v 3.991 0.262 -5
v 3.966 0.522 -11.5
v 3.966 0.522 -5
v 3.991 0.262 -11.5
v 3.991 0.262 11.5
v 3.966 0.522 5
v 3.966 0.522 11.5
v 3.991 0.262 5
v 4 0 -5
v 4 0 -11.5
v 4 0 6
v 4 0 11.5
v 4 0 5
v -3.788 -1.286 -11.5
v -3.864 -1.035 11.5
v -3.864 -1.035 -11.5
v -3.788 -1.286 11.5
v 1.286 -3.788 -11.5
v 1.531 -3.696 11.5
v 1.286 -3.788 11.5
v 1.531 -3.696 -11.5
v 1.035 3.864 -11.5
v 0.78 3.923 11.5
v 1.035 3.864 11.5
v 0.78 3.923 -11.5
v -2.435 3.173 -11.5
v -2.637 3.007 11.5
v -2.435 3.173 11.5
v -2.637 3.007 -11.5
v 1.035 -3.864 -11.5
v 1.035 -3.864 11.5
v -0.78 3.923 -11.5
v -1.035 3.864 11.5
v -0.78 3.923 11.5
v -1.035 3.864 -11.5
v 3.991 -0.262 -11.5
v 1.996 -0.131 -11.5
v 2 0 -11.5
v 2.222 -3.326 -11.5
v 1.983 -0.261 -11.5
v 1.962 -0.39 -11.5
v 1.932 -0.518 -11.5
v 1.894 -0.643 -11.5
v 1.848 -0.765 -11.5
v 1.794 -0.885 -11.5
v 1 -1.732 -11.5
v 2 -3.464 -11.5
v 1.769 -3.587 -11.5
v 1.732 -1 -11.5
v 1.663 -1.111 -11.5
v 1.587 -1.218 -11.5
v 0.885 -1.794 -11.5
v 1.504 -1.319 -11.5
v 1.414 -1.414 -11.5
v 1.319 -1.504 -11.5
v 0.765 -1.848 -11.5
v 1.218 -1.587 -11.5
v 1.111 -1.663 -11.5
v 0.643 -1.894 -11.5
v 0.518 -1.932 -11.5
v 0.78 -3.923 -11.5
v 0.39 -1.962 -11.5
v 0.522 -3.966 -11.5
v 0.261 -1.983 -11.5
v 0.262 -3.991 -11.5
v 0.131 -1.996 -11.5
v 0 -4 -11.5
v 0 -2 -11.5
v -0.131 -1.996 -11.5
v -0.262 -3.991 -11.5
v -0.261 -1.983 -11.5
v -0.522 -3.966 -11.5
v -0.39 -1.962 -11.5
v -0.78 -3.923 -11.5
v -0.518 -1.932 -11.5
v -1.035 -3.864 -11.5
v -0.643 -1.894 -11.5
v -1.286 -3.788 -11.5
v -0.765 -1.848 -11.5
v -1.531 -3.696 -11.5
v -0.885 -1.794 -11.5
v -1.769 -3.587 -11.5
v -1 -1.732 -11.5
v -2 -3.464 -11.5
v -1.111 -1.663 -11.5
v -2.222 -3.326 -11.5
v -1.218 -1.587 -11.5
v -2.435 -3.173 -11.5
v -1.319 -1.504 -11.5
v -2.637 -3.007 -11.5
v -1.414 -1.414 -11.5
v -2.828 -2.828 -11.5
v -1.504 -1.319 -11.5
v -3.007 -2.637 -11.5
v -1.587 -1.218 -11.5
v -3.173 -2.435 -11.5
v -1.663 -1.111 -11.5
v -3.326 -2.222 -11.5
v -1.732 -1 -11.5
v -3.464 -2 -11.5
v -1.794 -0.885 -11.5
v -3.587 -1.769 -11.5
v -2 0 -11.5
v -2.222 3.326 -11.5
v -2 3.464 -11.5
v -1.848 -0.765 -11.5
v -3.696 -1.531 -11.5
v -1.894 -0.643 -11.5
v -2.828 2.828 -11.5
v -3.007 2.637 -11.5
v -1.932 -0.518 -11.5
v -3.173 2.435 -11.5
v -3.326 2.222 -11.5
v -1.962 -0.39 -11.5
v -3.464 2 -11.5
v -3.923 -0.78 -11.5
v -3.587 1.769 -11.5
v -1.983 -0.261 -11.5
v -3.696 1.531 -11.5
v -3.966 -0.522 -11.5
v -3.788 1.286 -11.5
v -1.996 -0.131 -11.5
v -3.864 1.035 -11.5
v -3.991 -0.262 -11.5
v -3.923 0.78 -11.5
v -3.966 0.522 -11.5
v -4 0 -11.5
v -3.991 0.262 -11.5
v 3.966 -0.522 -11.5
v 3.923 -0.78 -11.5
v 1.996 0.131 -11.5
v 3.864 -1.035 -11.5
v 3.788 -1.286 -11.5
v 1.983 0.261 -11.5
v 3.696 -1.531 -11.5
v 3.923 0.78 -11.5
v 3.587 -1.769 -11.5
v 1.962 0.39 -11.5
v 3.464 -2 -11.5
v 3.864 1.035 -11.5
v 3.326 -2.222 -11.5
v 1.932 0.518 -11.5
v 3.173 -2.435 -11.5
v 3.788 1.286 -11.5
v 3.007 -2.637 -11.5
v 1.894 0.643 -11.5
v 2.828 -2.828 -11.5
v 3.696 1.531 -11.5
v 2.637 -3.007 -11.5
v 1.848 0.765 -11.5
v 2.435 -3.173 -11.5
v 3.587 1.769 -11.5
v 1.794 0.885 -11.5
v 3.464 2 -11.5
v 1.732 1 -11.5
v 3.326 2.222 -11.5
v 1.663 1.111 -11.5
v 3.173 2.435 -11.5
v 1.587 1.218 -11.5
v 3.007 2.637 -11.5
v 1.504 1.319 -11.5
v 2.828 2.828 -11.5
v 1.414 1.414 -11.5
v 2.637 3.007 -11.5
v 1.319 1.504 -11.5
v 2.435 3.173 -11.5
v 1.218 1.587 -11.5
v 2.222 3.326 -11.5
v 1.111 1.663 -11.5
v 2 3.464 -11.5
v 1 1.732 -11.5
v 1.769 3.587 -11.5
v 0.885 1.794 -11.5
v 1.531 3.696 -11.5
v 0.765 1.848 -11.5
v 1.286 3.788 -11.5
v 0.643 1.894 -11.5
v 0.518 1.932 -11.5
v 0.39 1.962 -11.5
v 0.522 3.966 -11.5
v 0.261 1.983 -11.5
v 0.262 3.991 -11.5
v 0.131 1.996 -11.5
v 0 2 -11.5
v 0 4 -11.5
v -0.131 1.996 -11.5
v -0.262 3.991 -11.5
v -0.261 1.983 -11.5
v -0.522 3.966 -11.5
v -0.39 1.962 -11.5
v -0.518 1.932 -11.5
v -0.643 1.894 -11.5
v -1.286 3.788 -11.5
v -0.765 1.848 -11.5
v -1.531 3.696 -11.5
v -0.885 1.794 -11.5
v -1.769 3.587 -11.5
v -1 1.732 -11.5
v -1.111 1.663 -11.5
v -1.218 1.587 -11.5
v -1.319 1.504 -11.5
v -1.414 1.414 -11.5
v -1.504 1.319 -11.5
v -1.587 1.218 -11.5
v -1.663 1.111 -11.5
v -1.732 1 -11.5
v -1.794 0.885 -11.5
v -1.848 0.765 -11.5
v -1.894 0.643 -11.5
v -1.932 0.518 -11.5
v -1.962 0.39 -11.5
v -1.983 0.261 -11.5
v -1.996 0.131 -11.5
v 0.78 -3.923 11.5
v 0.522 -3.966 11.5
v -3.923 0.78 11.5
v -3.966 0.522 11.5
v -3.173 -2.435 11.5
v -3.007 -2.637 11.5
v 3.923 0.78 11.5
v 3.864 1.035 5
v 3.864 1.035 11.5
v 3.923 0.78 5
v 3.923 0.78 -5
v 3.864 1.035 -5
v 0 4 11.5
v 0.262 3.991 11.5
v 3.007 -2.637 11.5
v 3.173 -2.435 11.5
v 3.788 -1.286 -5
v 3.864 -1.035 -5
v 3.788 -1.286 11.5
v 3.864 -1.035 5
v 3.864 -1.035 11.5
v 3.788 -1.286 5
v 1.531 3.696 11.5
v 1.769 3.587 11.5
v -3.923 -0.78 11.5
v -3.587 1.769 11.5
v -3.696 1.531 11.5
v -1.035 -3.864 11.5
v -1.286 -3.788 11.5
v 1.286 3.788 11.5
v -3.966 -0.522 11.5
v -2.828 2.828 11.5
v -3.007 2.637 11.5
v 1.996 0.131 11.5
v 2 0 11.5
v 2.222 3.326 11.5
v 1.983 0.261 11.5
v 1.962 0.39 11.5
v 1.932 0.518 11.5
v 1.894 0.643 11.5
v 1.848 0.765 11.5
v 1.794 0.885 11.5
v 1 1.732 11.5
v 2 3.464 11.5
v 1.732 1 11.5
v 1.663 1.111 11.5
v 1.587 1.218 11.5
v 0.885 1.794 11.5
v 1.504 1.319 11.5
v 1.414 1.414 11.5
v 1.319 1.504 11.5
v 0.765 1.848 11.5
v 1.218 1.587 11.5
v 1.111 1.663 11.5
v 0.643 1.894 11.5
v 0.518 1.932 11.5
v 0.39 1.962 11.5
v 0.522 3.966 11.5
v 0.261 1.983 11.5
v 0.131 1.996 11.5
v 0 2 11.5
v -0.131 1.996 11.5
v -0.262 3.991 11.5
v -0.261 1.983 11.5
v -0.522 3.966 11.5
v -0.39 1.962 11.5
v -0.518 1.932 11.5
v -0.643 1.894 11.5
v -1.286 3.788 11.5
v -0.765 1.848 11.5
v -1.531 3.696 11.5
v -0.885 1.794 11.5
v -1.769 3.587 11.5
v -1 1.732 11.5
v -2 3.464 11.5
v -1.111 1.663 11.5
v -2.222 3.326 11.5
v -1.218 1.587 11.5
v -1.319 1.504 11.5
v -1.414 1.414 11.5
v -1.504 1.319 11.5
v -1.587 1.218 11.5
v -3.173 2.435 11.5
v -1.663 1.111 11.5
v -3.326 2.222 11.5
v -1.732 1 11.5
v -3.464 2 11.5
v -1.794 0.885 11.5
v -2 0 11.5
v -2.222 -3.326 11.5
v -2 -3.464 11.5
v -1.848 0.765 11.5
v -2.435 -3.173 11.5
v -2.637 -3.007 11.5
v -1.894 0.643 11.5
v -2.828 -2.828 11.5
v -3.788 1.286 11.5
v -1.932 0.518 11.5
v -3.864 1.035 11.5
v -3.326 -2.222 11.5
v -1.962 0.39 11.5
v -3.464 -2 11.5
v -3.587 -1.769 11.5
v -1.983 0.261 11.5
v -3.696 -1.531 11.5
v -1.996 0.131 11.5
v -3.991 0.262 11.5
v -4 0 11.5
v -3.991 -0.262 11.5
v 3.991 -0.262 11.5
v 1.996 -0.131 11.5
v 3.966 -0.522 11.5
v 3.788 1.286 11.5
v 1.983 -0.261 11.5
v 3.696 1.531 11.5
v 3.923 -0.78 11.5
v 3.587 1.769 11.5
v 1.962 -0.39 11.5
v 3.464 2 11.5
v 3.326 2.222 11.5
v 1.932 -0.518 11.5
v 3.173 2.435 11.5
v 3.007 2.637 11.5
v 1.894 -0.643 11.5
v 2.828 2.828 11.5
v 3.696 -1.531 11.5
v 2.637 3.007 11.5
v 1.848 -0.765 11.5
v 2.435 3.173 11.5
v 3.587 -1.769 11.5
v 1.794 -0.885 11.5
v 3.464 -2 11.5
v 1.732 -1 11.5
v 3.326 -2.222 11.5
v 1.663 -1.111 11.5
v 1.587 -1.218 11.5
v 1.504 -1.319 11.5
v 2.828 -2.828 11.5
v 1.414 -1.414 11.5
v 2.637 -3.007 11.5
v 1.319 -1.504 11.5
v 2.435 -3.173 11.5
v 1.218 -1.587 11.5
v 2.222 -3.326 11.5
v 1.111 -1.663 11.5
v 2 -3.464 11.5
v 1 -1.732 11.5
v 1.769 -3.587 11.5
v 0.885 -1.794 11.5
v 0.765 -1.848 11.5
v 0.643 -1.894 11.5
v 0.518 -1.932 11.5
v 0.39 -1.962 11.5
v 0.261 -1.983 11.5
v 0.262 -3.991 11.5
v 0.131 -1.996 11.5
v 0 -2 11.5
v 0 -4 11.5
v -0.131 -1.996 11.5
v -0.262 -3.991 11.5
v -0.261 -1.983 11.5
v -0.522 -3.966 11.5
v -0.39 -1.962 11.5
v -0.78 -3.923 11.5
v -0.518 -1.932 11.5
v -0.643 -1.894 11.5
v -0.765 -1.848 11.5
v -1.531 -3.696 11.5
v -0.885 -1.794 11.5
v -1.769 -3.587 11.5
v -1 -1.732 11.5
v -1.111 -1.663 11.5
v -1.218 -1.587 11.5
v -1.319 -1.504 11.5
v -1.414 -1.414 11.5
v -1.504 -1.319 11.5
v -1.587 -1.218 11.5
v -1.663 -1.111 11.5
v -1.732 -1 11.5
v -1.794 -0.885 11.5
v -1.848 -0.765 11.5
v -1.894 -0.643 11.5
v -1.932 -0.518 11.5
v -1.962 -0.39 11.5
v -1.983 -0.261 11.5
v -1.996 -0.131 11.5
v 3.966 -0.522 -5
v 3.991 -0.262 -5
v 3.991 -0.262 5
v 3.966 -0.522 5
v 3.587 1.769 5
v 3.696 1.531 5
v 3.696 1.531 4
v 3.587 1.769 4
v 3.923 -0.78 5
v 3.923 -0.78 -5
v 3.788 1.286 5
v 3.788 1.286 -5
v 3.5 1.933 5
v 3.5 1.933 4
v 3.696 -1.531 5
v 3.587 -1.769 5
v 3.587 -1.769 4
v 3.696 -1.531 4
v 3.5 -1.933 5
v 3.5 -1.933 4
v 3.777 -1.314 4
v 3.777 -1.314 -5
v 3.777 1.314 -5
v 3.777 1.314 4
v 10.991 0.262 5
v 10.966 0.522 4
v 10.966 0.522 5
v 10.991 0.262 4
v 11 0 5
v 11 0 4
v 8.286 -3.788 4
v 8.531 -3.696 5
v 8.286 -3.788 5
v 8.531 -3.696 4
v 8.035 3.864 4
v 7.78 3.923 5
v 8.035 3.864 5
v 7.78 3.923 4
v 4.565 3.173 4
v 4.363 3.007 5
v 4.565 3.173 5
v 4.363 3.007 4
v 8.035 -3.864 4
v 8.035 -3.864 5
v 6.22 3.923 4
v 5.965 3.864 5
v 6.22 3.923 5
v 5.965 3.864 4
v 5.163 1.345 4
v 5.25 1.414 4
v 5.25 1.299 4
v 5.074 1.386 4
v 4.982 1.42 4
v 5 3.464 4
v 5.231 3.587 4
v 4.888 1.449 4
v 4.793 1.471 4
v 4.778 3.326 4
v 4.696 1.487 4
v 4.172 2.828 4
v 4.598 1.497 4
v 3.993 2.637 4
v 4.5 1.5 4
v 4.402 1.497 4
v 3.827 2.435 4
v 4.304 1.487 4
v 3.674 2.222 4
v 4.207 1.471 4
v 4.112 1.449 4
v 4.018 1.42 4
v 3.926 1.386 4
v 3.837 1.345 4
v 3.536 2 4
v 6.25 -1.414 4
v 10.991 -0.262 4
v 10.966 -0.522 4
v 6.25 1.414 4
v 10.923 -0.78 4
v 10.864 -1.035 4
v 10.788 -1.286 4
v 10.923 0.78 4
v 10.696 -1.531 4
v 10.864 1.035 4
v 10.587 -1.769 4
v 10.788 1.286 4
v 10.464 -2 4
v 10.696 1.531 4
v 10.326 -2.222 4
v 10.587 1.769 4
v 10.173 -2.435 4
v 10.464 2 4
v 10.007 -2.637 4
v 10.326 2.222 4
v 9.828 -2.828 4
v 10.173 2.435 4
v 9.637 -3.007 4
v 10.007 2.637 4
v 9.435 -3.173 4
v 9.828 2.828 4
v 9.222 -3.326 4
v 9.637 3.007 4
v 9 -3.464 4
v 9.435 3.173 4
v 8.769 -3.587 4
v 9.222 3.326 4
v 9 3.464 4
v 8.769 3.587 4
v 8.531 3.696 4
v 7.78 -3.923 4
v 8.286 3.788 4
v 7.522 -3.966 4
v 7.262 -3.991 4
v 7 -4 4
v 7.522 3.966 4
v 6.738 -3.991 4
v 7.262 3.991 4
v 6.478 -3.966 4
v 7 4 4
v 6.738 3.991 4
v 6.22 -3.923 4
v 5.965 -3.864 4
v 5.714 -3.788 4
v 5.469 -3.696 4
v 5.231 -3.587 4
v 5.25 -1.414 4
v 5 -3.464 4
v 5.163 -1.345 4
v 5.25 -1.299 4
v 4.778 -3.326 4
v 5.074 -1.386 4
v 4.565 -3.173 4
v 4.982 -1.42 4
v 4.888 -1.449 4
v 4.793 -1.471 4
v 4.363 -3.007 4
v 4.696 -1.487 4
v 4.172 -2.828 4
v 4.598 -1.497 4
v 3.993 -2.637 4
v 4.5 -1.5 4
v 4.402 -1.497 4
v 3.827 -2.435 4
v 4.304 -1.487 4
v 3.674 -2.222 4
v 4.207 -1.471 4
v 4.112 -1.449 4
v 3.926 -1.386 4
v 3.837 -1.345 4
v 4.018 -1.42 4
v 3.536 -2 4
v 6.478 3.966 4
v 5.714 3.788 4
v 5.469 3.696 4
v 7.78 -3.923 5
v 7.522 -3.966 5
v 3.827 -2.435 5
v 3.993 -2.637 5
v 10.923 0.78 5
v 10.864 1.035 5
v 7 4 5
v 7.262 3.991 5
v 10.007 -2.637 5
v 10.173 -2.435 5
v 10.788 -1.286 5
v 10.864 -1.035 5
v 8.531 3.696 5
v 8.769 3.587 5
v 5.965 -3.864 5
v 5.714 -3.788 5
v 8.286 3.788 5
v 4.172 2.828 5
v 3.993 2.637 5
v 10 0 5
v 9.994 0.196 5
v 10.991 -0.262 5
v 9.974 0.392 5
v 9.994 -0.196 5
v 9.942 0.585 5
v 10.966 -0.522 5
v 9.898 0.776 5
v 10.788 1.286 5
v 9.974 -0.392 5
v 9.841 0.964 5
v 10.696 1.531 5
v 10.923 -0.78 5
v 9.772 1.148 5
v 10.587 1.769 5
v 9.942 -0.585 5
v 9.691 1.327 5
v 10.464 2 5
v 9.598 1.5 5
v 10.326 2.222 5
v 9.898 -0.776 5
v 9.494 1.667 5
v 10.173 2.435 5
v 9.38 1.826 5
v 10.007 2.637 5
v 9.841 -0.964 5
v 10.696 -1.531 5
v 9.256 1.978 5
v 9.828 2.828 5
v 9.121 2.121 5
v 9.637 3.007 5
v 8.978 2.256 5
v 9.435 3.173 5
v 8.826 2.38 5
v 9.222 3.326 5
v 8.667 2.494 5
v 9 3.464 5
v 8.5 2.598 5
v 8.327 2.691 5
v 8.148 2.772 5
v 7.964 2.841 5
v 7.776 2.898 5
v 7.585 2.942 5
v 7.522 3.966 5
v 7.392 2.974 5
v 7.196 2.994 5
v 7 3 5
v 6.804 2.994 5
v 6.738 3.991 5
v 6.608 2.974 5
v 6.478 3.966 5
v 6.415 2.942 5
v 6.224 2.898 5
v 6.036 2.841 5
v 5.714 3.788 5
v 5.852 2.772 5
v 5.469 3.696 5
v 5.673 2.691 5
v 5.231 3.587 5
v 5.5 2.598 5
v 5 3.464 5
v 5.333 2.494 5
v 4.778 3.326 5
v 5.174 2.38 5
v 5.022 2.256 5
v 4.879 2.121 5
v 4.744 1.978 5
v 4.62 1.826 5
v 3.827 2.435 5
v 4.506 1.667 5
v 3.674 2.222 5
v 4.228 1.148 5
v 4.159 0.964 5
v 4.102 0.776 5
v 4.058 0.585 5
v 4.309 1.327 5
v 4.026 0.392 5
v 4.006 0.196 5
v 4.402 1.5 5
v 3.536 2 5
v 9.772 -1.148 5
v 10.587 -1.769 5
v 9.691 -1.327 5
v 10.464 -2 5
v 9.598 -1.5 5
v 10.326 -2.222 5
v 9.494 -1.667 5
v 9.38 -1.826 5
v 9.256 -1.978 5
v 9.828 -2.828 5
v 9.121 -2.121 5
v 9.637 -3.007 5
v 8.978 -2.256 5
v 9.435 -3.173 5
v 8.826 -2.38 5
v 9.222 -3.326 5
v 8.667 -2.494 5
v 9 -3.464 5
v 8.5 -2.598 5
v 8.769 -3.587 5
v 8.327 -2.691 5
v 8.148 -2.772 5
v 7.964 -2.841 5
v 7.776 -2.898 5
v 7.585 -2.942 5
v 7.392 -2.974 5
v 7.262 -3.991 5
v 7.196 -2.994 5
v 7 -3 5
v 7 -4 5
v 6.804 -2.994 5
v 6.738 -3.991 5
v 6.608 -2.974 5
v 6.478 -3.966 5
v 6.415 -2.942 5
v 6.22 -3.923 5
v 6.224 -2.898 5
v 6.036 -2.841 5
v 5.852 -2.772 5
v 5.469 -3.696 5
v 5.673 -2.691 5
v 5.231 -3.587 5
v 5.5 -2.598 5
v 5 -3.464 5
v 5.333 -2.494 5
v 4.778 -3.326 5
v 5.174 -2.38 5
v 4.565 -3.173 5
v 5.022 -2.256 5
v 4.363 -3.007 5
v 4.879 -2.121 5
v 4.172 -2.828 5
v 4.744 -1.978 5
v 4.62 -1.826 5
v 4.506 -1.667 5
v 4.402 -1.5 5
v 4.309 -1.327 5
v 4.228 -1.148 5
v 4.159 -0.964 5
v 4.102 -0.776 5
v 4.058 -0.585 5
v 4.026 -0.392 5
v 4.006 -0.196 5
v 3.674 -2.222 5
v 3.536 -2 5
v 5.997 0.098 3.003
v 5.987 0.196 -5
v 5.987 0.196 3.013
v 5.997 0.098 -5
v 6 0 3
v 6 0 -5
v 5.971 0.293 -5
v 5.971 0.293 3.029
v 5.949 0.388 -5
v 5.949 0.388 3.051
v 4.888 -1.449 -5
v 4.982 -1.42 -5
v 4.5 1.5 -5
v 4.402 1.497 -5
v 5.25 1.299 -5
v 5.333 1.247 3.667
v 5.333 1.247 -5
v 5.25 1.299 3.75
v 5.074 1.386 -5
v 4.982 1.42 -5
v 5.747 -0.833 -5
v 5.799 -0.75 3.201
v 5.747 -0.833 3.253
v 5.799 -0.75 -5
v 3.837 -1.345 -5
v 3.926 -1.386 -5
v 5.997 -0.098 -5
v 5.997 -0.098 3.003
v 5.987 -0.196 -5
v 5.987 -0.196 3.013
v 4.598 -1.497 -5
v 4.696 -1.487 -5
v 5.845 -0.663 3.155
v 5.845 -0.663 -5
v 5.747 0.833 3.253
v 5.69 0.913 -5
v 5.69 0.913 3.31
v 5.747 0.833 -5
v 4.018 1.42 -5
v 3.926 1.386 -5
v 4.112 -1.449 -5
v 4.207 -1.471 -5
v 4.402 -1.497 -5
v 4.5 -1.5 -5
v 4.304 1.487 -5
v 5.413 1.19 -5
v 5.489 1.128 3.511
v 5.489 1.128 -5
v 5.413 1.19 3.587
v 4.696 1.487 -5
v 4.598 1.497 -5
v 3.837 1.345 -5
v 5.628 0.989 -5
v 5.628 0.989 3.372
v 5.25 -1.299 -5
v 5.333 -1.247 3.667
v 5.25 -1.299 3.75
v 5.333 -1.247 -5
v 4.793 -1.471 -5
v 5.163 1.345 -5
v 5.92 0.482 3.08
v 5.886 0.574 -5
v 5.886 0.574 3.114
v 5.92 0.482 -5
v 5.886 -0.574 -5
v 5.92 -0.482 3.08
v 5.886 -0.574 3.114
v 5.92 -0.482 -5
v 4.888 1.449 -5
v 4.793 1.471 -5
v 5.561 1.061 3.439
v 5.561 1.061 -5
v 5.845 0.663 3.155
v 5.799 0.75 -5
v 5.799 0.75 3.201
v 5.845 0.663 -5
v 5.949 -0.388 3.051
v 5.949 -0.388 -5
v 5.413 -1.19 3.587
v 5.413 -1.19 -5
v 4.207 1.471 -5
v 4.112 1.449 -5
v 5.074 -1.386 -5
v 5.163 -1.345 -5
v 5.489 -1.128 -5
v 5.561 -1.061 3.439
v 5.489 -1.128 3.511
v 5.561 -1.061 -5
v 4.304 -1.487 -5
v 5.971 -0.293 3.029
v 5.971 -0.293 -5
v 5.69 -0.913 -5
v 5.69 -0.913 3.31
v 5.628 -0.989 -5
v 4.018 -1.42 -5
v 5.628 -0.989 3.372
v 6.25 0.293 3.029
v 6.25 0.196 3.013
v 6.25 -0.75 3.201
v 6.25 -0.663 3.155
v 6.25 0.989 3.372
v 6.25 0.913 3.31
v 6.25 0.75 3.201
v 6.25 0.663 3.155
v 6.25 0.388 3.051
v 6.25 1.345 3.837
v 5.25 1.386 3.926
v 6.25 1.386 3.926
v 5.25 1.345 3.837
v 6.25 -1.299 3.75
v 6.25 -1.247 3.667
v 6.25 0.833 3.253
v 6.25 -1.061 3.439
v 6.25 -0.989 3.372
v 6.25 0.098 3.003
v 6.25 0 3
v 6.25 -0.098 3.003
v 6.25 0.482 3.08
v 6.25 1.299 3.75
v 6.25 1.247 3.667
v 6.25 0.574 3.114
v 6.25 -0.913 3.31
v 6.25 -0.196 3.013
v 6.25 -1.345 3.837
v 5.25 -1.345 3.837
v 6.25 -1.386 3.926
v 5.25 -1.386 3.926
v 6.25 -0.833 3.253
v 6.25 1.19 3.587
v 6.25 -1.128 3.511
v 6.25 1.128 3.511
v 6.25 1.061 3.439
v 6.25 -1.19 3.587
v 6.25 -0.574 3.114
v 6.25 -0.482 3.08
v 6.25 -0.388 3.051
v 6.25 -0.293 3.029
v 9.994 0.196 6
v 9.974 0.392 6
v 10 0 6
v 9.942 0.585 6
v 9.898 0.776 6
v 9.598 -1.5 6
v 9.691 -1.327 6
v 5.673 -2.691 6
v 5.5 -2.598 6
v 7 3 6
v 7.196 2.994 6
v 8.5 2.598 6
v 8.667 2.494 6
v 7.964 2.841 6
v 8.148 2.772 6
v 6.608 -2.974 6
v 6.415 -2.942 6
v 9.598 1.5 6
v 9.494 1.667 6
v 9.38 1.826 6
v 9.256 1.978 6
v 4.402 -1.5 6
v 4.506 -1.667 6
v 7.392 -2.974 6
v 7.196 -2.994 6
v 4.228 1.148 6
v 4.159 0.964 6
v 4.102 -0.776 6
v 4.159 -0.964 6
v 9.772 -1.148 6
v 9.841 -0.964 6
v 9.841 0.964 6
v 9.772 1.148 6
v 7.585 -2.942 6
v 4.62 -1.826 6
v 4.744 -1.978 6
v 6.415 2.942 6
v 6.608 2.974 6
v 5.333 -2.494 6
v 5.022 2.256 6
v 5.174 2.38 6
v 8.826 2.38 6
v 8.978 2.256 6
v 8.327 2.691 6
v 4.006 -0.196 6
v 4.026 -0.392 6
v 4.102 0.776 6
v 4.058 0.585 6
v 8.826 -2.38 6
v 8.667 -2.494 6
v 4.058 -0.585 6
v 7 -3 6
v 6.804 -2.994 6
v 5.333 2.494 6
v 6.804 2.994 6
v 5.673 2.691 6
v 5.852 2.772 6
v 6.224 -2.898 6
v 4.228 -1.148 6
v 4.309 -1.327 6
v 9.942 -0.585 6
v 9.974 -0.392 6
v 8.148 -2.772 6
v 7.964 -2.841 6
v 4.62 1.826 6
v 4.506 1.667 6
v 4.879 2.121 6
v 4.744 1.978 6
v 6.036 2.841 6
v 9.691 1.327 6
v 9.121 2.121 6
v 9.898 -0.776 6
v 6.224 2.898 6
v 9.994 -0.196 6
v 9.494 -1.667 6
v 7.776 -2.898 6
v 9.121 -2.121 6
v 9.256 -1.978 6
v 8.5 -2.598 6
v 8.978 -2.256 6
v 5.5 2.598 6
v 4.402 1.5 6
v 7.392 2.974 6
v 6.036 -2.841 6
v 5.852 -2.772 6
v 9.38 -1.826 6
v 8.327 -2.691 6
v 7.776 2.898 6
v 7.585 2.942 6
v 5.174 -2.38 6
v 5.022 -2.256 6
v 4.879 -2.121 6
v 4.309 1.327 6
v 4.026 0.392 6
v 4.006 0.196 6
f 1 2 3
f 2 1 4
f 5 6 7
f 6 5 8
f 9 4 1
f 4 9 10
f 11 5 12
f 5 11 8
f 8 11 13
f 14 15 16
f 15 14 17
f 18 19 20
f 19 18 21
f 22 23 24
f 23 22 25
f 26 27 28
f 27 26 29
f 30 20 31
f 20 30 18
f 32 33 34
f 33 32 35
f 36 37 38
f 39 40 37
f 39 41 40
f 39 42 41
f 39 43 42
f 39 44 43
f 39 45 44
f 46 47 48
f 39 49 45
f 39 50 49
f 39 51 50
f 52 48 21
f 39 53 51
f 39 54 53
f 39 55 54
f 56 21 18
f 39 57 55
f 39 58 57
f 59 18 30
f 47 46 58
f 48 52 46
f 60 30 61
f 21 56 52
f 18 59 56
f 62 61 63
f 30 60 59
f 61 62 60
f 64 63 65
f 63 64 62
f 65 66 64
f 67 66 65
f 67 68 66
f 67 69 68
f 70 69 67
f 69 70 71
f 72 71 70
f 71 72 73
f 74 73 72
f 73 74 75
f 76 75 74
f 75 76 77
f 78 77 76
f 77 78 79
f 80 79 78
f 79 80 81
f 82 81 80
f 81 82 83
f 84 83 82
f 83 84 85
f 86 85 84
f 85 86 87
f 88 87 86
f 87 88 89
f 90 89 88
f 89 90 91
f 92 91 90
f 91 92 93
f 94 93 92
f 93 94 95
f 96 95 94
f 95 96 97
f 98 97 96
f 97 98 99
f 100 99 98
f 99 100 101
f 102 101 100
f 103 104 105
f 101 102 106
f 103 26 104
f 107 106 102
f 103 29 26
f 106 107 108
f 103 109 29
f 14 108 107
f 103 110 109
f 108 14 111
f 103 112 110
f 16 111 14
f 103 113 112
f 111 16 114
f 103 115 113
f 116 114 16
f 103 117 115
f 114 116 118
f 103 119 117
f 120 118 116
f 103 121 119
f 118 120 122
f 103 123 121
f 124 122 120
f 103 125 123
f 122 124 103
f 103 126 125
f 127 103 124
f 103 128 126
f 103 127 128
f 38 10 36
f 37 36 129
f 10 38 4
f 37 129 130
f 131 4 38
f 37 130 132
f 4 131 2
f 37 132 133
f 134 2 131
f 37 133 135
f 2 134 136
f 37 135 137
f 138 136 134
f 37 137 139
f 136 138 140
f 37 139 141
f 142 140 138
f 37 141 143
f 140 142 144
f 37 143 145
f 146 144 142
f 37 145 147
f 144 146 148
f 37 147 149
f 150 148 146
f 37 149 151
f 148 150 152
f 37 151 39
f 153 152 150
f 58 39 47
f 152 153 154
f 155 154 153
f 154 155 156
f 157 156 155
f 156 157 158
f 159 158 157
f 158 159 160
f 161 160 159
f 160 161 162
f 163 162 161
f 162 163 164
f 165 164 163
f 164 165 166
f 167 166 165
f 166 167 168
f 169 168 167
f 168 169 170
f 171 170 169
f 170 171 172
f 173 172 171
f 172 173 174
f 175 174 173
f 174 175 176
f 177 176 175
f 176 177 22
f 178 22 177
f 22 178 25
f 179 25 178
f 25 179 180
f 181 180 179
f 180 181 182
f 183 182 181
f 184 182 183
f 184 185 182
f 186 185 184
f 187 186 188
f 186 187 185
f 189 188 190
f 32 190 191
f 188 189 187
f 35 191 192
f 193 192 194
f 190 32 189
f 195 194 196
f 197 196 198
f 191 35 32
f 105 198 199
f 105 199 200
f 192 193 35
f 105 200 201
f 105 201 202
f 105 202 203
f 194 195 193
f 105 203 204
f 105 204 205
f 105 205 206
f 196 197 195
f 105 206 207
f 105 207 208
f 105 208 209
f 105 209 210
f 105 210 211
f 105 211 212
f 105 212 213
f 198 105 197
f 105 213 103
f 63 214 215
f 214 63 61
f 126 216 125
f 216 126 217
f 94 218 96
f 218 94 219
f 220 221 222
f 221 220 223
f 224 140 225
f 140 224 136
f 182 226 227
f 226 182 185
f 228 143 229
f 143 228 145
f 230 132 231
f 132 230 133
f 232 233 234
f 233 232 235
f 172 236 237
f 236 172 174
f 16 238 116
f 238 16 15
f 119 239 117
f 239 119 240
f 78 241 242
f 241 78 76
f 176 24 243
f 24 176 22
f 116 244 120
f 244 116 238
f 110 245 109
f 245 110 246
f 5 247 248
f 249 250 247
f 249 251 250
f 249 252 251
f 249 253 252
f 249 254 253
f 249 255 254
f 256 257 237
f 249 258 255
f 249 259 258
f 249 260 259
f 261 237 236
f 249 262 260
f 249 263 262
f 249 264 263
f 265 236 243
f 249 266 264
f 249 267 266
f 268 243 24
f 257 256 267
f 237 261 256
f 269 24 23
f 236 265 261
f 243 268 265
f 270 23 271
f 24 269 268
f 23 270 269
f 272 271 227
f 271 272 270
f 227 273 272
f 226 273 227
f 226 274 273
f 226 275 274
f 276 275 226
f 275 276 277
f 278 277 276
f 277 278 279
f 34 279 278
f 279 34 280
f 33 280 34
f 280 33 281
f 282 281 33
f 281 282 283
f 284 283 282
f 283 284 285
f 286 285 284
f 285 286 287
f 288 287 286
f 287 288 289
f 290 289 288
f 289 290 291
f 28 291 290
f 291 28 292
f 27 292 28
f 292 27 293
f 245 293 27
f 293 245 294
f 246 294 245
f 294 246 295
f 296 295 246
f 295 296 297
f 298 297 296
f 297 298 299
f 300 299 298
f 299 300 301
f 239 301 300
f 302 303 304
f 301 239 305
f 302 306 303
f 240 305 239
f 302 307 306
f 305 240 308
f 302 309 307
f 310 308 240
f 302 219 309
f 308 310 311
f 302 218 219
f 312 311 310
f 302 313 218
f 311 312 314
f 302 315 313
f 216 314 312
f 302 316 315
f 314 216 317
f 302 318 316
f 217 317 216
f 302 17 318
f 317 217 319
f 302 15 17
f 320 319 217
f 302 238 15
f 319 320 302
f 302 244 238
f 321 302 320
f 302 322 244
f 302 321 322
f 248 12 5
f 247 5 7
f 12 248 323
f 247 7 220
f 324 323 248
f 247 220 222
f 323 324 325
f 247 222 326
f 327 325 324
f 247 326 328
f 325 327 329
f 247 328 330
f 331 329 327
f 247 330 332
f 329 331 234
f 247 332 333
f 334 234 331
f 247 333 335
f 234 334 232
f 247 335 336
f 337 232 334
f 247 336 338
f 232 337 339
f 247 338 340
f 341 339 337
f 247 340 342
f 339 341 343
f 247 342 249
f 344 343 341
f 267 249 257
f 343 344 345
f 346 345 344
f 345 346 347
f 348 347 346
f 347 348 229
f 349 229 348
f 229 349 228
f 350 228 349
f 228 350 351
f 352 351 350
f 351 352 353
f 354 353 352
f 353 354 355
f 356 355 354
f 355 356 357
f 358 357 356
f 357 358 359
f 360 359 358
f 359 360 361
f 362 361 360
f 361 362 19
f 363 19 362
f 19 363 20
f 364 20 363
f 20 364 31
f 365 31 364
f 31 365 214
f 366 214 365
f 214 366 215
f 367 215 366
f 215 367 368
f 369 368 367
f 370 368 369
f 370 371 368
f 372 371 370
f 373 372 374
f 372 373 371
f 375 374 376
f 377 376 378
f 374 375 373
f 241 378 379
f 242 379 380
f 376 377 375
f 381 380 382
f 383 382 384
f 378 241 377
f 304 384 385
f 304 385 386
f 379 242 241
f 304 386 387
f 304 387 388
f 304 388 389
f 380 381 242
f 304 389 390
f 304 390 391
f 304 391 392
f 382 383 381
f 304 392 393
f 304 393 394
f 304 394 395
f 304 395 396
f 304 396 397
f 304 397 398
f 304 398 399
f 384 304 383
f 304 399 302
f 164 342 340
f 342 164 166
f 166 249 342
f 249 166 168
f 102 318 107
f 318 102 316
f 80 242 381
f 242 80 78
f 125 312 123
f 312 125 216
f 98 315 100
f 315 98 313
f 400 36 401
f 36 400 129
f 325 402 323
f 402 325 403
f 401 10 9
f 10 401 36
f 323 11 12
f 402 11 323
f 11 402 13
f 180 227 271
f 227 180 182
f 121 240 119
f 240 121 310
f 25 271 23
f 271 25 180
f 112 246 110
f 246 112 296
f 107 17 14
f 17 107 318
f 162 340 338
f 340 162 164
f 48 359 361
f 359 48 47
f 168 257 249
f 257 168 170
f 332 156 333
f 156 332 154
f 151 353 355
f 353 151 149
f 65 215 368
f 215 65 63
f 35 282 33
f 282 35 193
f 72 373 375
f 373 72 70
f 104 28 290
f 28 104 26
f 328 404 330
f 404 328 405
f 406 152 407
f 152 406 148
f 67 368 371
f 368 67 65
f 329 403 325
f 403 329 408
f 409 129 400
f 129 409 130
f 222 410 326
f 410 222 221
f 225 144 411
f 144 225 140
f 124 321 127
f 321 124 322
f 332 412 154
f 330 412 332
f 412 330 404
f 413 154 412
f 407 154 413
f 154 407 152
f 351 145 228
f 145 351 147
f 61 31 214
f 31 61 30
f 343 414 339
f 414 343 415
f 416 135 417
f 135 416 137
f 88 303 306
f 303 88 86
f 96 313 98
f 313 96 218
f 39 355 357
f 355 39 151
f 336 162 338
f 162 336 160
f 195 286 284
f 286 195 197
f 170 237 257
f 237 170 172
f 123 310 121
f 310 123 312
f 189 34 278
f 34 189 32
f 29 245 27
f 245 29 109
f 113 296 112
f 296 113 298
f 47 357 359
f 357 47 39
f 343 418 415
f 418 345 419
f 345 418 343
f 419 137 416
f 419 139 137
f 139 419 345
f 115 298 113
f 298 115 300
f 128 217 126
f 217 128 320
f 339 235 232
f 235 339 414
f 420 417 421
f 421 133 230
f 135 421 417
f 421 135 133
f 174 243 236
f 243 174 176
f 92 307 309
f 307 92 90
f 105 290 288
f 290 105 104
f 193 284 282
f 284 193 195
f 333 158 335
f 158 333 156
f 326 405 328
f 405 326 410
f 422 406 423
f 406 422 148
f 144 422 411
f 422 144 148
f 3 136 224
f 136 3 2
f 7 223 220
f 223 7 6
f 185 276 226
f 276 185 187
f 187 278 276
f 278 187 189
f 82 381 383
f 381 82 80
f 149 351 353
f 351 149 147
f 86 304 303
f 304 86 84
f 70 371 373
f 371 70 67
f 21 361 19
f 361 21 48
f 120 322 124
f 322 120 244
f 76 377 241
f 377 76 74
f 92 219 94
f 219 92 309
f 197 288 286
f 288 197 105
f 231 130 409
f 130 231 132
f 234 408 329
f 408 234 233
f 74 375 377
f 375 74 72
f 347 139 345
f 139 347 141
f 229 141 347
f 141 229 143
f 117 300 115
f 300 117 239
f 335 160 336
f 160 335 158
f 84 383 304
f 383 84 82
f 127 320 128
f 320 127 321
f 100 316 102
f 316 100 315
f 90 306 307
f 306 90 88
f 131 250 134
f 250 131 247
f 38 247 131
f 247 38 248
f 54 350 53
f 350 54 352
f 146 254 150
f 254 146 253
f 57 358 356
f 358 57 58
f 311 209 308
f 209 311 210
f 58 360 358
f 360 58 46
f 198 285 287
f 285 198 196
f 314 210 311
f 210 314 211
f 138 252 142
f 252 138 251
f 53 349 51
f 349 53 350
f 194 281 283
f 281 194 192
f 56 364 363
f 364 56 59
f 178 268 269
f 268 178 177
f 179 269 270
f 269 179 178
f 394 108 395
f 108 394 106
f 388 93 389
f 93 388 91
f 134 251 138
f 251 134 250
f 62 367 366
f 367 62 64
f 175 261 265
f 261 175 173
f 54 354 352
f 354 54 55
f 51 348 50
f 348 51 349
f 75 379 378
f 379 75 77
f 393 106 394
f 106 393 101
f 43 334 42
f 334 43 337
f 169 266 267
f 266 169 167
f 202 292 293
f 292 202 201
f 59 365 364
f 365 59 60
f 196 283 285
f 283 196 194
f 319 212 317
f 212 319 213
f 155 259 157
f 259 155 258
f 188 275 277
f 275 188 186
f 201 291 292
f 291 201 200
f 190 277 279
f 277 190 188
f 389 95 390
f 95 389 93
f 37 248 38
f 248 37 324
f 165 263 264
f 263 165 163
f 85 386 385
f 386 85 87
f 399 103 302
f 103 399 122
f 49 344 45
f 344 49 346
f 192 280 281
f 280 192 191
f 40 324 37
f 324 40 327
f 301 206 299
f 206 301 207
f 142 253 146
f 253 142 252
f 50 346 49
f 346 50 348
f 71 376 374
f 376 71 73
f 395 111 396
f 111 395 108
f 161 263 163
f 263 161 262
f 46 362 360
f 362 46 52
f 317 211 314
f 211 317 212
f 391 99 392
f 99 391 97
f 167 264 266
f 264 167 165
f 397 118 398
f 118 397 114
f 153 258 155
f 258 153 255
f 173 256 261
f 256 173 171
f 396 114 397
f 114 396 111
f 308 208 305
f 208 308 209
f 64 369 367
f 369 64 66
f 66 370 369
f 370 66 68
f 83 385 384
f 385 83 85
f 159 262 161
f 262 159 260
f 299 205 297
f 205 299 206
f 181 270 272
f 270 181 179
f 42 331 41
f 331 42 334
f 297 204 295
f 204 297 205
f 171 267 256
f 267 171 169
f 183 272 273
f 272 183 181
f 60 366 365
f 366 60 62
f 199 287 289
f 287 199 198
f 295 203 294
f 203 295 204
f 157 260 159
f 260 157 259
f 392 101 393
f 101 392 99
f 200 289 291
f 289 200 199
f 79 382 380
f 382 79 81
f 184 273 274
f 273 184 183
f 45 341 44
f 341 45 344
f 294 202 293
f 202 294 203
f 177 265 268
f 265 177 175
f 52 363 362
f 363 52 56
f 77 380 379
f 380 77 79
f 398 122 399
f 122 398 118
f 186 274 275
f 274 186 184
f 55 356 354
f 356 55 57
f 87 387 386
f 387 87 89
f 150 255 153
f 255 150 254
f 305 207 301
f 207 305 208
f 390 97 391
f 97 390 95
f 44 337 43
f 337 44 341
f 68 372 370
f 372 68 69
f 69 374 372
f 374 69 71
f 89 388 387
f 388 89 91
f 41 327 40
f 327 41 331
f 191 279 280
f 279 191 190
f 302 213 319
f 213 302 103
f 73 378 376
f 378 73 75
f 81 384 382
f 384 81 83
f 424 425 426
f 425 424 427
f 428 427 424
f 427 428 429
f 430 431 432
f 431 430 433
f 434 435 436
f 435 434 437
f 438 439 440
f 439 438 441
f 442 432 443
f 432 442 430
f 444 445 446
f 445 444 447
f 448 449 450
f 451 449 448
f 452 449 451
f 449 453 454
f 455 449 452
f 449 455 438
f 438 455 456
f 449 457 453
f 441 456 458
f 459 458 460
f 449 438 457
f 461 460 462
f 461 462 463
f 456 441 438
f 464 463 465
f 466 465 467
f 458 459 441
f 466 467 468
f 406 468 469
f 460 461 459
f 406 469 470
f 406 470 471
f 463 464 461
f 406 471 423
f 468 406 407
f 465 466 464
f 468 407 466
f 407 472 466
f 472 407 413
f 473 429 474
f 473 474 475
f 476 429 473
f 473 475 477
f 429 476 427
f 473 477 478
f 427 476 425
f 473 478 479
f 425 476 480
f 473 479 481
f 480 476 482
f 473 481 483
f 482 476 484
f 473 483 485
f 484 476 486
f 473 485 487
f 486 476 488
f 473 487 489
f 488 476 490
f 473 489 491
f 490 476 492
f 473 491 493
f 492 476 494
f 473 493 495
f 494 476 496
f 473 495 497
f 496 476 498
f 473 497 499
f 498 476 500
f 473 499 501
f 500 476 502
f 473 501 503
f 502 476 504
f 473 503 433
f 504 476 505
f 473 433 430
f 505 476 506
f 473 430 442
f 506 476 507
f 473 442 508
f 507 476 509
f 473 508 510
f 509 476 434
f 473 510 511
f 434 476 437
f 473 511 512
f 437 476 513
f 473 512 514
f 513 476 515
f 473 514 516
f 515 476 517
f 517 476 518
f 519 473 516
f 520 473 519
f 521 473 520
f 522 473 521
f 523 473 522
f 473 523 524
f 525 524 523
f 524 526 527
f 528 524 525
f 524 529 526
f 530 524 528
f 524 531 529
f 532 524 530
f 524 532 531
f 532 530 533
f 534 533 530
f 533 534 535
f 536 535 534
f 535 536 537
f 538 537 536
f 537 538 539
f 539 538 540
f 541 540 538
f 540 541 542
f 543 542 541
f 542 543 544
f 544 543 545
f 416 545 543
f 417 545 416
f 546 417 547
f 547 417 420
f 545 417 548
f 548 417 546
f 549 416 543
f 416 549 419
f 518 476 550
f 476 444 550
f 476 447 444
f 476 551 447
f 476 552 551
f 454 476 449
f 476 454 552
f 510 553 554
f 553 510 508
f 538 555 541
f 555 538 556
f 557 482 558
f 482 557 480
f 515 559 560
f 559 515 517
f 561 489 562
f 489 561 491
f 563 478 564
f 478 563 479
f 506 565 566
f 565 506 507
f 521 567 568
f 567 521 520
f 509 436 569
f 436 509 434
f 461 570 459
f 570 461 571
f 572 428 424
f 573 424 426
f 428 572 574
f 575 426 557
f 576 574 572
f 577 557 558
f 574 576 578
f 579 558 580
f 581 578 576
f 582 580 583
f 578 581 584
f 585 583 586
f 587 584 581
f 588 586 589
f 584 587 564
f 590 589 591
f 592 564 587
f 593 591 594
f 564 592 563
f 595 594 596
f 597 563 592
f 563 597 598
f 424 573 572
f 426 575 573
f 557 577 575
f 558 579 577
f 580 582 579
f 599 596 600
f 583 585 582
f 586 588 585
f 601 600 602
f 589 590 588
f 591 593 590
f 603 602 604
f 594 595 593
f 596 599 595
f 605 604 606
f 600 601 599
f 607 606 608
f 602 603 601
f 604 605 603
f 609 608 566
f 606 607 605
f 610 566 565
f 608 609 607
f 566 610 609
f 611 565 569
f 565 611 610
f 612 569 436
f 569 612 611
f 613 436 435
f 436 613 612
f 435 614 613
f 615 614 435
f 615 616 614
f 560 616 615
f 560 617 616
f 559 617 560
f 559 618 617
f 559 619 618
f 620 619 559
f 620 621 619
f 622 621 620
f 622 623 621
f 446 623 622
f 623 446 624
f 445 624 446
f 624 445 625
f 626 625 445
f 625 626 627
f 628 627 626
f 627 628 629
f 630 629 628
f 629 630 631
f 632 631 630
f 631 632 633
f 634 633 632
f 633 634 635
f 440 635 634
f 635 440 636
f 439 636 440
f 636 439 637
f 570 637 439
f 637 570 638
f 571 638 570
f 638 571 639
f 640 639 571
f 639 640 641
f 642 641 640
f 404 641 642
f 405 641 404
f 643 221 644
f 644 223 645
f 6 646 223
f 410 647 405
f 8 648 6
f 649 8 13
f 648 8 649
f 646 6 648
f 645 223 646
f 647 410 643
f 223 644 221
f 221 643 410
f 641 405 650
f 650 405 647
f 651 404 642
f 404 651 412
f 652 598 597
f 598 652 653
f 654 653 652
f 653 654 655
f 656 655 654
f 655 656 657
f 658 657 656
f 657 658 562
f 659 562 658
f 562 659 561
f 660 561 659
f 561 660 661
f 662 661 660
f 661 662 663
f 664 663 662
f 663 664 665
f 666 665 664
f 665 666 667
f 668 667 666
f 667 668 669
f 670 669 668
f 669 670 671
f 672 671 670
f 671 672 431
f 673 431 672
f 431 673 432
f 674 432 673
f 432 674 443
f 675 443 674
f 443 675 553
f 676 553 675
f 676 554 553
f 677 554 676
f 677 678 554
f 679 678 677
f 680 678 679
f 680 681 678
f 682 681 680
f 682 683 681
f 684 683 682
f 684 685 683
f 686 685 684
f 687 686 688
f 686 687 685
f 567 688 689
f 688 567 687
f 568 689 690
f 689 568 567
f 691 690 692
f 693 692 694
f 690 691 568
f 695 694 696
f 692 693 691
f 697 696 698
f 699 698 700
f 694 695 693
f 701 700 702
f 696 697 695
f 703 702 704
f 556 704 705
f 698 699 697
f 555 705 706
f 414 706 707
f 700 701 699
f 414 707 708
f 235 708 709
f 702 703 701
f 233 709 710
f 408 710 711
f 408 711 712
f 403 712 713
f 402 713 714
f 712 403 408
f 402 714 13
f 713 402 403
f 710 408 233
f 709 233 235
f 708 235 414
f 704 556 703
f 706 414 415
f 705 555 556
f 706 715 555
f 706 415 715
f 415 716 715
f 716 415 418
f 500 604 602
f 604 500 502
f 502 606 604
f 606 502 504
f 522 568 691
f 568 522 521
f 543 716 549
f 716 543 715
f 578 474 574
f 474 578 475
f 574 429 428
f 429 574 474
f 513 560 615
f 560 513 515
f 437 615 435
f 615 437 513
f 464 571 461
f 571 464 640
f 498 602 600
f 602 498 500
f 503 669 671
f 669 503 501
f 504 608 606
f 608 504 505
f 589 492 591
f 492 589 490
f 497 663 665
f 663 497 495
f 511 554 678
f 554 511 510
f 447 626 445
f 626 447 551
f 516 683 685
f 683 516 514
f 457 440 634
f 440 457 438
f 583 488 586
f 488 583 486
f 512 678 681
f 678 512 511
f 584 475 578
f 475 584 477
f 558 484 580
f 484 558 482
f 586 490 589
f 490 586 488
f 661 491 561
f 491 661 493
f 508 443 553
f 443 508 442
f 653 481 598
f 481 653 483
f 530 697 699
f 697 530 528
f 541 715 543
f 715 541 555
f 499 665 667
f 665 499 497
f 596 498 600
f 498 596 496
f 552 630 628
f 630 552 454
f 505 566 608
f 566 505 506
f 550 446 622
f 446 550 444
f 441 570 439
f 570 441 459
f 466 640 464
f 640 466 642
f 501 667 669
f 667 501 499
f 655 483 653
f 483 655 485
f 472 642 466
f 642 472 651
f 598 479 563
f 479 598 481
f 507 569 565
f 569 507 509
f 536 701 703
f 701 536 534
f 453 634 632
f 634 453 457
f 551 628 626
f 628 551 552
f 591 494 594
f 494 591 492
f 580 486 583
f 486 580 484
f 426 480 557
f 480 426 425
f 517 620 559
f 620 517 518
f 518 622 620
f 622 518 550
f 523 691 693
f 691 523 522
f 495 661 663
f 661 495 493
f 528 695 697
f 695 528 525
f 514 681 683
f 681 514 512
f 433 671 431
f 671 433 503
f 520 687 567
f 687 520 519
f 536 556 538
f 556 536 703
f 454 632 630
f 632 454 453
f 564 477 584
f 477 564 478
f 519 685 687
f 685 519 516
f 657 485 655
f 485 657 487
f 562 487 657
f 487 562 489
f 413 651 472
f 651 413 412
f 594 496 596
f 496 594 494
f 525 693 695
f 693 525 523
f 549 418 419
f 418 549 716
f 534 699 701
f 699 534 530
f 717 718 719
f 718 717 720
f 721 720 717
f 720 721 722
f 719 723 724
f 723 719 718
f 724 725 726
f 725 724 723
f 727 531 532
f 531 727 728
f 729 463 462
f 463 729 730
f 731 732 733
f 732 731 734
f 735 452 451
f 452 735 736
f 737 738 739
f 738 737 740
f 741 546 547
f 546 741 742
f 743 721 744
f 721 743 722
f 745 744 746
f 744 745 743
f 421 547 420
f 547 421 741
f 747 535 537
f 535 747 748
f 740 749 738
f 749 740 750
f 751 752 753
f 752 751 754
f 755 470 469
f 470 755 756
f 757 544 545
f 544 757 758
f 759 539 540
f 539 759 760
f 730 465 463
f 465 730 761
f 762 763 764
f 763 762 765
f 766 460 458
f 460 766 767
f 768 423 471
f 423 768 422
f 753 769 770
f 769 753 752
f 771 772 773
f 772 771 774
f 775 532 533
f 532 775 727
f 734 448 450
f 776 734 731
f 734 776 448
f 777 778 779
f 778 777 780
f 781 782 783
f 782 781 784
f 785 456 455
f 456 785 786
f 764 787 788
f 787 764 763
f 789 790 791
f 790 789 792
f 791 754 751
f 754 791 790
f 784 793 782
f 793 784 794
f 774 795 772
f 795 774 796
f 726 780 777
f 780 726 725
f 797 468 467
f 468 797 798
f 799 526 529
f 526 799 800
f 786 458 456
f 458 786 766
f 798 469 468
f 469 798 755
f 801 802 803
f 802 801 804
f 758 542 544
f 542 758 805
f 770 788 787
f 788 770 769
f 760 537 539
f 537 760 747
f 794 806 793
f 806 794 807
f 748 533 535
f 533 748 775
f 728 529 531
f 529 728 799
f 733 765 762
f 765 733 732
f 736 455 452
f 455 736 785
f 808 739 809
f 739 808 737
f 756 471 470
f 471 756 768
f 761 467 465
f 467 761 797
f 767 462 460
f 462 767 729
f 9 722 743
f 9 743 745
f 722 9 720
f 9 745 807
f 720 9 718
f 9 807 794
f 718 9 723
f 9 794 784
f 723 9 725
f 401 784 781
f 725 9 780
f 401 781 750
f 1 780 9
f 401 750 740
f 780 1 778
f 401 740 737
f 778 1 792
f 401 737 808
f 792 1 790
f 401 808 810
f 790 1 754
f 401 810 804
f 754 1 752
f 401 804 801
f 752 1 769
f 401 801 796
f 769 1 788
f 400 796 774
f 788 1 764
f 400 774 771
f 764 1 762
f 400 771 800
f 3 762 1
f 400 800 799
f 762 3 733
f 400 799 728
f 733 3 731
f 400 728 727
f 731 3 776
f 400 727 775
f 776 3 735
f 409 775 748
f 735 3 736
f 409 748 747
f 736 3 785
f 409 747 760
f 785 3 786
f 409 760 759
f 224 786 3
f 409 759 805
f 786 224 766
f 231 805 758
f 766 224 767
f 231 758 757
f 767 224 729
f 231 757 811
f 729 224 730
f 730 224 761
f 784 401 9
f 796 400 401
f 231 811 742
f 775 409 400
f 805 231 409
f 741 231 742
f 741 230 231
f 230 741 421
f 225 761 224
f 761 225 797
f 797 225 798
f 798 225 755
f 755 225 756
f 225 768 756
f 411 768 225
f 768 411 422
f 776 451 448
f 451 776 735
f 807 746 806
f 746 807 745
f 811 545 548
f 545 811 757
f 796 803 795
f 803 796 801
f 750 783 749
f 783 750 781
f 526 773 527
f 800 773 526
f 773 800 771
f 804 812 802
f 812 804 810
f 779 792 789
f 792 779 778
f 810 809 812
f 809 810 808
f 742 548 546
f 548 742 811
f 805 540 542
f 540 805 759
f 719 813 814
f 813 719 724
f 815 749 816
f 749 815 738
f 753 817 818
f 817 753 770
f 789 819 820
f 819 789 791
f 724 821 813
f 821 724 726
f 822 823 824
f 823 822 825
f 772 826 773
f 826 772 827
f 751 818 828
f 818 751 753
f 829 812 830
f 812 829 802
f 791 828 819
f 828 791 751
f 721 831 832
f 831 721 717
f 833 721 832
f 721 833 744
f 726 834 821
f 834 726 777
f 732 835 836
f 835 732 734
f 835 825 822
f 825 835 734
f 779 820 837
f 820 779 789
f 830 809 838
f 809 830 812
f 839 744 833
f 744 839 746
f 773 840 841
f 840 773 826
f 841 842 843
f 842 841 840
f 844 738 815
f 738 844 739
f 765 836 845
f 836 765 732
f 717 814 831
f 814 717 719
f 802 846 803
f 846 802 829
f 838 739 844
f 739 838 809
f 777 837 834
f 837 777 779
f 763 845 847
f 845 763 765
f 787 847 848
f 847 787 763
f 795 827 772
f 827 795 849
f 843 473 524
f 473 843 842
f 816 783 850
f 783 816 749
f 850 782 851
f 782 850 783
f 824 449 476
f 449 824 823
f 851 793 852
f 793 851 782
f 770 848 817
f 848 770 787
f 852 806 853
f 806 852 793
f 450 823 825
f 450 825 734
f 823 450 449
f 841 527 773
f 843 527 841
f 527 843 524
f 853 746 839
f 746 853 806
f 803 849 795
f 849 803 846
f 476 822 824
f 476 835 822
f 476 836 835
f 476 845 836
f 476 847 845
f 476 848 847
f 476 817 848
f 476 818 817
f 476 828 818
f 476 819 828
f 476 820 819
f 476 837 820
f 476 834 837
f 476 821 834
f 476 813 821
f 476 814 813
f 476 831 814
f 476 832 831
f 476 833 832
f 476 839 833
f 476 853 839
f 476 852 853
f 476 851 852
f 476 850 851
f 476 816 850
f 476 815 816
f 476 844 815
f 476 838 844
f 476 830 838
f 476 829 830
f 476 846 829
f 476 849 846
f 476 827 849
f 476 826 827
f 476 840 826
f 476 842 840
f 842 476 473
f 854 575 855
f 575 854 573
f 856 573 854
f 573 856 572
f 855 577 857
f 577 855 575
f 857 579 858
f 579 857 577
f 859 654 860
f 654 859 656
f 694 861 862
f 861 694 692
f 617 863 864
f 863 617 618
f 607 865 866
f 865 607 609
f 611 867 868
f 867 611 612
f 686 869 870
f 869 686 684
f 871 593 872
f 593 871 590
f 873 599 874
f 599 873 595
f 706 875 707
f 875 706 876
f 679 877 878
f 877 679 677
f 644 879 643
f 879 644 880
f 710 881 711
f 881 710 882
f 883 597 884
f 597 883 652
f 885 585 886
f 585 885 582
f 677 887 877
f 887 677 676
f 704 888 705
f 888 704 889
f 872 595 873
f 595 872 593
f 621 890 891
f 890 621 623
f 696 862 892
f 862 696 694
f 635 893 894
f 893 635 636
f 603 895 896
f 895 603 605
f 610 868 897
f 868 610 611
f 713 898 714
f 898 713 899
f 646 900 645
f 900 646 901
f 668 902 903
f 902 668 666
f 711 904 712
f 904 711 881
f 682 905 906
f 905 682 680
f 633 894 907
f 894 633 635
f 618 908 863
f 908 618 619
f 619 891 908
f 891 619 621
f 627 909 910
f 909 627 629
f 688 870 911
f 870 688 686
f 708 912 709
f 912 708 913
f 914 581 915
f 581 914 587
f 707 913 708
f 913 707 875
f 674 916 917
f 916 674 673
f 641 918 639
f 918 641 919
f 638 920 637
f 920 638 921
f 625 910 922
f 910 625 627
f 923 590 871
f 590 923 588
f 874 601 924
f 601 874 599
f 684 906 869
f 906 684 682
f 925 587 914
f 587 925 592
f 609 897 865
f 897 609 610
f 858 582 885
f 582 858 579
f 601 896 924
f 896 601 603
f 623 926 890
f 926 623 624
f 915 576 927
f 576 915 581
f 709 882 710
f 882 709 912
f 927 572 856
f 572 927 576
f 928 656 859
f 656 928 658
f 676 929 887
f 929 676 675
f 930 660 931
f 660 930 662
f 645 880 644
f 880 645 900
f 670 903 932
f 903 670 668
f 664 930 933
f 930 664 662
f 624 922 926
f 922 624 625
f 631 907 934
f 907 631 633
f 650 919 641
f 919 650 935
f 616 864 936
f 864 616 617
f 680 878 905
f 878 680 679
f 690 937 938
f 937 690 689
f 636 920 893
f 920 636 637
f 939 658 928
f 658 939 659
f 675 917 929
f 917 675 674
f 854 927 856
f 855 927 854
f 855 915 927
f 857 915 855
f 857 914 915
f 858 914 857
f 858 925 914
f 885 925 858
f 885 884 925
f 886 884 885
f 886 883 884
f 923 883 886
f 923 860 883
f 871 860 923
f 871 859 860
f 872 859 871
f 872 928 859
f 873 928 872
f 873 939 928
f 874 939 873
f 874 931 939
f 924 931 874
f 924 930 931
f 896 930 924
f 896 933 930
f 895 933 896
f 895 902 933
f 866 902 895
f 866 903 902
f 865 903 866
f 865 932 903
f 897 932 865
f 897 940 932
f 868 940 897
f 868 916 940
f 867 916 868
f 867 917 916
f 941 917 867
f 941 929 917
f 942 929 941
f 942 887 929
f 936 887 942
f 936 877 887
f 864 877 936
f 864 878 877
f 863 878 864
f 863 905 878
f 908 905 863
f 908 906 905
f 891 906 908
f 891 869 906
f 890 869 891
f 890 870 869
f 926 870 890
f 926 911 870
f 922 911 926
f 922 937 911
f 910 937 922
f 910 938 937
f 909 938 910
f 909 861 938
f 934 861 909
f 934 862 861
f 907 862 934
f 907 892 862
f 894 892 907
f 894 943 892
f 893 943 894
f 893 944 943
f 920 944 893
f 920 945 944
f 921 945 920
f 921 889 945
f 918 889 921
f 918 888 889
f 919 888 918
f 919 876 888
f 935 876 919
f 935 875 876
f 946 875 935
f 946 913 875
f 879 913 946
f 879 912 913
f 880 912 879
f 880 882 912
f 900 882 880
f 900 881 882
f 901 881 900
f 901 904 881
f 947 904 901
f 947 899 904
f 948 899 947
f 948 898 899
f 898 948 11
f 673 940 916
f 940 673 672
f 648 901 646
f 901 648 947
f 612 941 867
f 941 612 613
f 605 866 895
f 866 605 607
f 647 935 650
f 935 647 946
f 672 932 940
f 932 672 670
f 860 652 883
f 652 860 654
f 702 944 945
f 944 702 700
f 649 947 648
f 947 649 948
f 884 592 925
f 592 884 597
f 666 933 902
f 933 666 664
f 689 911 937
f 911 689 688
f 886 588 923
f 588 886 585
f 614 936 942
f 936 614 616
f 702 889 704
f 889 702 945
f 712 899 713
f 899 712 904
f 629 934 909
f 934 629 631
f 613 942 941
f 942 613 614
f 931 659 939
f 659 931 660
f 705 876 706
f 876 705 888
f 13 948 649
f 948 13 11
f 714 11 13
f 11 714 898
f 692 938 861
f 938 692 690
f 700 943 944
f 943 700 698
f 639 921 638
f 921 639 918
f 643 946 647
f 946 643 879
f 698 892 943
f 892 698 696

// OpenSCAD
// Parameters
bore_diameter_mm = 4.0; //[2.0:8.0:0.1]
outer_diameter_mm = 8.0; //[4.0:16.0:0.1]
length_mm = 23.0; //[12.0:46.0:0.5]
casing_wall_thickness_mm = 0.4; //[0.2:1.0:0.05]
seal_ring_thickness_mm = 0.5; //[0.2:1.5:0.05]
seal_ring_radial_width_mm = 0.3; //[0.1:1.0:0.05]
overlap_mm = 1.0; //[0.5:2.0:0.1]
seal_enabled = 1; //[0:1:1]
screw_shank_diameter_mm = 3.0; //[2.0:6.0:0.1]
screw_length_mm = 10.0; //[5.0:25.0:0.5]
screw_head_diameter_mm = 6.0; //[4.0:12.0:0.1]
screw_head_height_mm = 2.0; //[1.0:5.0:0.1]
washer_outer_diameter_mm = 8.0; //[5.0:16.0:0.1]
washer_thickness_mm = 1.0; //[0.5:3.0:0.1]

$fn = 96;

// Linear Bearing - complete geometry (single connected solid)
module linear_bearing() {
  color("Silver")
  union() {
    // Outer casing (hollow)
    difference() {
      cylinder(h=length_mm, r=outer_diameter_mm/2, center=true);
      cylinder(h=length_mm + 2*overlap_mm, r=bore_diameter_mm/2, center=true);
    }

    // Seal rings (overlap into casing so they are physically connected)
    if (seal_enabled) {
      for (zpos = [
        ( length_mm/2 - seal_ring_thickness_mm/2 - overlap_mm/2),
        (-length_mm/2 + seal_ring_thickness_mm/2 + overlap_mm/2)
      ]) {
        translate([0,0,zpos])
          difference() {
            cylinder(
              h=seal_ring_thickness_mm + overlap_mm,  // ensures intersection with casing
              r=bore_diameter_mm/2 + seal_ring_radial_width_mm,
              center=true
            );
            cylinder(
              h=seal_ring_thickness_mm + 2*overlap_mm,
              r=bore_diameter_mm/2,
              center=true
            );
          }
      }
    }
  }
}

// Side pin/rod with small flange (screw + washer + head) - ATTACHED to bearing
module screw_and_washer_attached() {
  // Ensure the shank intersects the bearing OD by overlap_mm (guaranteed merge)
  x_attach = outer_diameter_mm/2 + screw_shank_diameter_mm/2 - overlap_mm;

  // Ensure washer also intersects the bearing OD by overlap_mm (prevents "floating flange")
  // Washer is larger than shank, so its center must be closer to the bearing.
  x_attach_washer = outer_diameter_mm/2 + washer_outer_diameter_mm/2 - overlap_mm;

  // Keep washer/head centered on the shank axis (same Y), but shift X so washer actually touches bearing.
  // Add a short "neck" that overlaps both shank and washer to keep the assembly one solid.
  neck_len = max(0, x_attach - x_attach_washer) + overlap_mm; // always >= overlap_mm

  color("DimGray")
  union() {
    // Screw shank (passes through bearing mid-plane)
    translate([x_attach, 0, 0])
      cylinder(h=screw_length_mm, r=screw_shank_diameter_mm/2, center=true);

    // Neck/bridge between shank axis and washer axis (guarantees connectivity even if X differs)
    translate([(x_attach + x_attach_washer)/2, 0, screw_length_mm/2 - washer_thickness_mm/2])
      rotate([0,90,0])
        cylinder(h=neck_len, r=screw_shank_diameter_mm/2, center=true);

    // Washer (flange) near the top end of the shank; positioned to intersect bearing
    translate([x_attach_washer, 0, screw_length_mm/2 - washer_thickness_mm/2])
      difference() {
        cylinder(h=washer_thickness_mm, r=washer_outer_diameter_mm/2, center=true);
        cylinder(h=washer_thickness_mm + 2*overlap_mm, r=screw_shank_diameter_mm/2, center=true);
      }

    // Screw head above washer; overlap slightly so head and washer are connected
    translate([x_attach_washer, 0, screw_length_mm/2 + screw_head_height_mm/2 - overlap_mm])
      cylinder(h=screw_head_height_mm, r=screw_head_diameter_mm/2, center=true);
  }
}

// Assembly - ALL parts connected and combined into a single union()
module assembly() {
  union() {
    linear_bearing();              // linear bearing present (missing part fixed)
    screw_and_washer_attached();   // attached with guaranteed overlap (floating/gap fixed)
  }
}

assembly();
